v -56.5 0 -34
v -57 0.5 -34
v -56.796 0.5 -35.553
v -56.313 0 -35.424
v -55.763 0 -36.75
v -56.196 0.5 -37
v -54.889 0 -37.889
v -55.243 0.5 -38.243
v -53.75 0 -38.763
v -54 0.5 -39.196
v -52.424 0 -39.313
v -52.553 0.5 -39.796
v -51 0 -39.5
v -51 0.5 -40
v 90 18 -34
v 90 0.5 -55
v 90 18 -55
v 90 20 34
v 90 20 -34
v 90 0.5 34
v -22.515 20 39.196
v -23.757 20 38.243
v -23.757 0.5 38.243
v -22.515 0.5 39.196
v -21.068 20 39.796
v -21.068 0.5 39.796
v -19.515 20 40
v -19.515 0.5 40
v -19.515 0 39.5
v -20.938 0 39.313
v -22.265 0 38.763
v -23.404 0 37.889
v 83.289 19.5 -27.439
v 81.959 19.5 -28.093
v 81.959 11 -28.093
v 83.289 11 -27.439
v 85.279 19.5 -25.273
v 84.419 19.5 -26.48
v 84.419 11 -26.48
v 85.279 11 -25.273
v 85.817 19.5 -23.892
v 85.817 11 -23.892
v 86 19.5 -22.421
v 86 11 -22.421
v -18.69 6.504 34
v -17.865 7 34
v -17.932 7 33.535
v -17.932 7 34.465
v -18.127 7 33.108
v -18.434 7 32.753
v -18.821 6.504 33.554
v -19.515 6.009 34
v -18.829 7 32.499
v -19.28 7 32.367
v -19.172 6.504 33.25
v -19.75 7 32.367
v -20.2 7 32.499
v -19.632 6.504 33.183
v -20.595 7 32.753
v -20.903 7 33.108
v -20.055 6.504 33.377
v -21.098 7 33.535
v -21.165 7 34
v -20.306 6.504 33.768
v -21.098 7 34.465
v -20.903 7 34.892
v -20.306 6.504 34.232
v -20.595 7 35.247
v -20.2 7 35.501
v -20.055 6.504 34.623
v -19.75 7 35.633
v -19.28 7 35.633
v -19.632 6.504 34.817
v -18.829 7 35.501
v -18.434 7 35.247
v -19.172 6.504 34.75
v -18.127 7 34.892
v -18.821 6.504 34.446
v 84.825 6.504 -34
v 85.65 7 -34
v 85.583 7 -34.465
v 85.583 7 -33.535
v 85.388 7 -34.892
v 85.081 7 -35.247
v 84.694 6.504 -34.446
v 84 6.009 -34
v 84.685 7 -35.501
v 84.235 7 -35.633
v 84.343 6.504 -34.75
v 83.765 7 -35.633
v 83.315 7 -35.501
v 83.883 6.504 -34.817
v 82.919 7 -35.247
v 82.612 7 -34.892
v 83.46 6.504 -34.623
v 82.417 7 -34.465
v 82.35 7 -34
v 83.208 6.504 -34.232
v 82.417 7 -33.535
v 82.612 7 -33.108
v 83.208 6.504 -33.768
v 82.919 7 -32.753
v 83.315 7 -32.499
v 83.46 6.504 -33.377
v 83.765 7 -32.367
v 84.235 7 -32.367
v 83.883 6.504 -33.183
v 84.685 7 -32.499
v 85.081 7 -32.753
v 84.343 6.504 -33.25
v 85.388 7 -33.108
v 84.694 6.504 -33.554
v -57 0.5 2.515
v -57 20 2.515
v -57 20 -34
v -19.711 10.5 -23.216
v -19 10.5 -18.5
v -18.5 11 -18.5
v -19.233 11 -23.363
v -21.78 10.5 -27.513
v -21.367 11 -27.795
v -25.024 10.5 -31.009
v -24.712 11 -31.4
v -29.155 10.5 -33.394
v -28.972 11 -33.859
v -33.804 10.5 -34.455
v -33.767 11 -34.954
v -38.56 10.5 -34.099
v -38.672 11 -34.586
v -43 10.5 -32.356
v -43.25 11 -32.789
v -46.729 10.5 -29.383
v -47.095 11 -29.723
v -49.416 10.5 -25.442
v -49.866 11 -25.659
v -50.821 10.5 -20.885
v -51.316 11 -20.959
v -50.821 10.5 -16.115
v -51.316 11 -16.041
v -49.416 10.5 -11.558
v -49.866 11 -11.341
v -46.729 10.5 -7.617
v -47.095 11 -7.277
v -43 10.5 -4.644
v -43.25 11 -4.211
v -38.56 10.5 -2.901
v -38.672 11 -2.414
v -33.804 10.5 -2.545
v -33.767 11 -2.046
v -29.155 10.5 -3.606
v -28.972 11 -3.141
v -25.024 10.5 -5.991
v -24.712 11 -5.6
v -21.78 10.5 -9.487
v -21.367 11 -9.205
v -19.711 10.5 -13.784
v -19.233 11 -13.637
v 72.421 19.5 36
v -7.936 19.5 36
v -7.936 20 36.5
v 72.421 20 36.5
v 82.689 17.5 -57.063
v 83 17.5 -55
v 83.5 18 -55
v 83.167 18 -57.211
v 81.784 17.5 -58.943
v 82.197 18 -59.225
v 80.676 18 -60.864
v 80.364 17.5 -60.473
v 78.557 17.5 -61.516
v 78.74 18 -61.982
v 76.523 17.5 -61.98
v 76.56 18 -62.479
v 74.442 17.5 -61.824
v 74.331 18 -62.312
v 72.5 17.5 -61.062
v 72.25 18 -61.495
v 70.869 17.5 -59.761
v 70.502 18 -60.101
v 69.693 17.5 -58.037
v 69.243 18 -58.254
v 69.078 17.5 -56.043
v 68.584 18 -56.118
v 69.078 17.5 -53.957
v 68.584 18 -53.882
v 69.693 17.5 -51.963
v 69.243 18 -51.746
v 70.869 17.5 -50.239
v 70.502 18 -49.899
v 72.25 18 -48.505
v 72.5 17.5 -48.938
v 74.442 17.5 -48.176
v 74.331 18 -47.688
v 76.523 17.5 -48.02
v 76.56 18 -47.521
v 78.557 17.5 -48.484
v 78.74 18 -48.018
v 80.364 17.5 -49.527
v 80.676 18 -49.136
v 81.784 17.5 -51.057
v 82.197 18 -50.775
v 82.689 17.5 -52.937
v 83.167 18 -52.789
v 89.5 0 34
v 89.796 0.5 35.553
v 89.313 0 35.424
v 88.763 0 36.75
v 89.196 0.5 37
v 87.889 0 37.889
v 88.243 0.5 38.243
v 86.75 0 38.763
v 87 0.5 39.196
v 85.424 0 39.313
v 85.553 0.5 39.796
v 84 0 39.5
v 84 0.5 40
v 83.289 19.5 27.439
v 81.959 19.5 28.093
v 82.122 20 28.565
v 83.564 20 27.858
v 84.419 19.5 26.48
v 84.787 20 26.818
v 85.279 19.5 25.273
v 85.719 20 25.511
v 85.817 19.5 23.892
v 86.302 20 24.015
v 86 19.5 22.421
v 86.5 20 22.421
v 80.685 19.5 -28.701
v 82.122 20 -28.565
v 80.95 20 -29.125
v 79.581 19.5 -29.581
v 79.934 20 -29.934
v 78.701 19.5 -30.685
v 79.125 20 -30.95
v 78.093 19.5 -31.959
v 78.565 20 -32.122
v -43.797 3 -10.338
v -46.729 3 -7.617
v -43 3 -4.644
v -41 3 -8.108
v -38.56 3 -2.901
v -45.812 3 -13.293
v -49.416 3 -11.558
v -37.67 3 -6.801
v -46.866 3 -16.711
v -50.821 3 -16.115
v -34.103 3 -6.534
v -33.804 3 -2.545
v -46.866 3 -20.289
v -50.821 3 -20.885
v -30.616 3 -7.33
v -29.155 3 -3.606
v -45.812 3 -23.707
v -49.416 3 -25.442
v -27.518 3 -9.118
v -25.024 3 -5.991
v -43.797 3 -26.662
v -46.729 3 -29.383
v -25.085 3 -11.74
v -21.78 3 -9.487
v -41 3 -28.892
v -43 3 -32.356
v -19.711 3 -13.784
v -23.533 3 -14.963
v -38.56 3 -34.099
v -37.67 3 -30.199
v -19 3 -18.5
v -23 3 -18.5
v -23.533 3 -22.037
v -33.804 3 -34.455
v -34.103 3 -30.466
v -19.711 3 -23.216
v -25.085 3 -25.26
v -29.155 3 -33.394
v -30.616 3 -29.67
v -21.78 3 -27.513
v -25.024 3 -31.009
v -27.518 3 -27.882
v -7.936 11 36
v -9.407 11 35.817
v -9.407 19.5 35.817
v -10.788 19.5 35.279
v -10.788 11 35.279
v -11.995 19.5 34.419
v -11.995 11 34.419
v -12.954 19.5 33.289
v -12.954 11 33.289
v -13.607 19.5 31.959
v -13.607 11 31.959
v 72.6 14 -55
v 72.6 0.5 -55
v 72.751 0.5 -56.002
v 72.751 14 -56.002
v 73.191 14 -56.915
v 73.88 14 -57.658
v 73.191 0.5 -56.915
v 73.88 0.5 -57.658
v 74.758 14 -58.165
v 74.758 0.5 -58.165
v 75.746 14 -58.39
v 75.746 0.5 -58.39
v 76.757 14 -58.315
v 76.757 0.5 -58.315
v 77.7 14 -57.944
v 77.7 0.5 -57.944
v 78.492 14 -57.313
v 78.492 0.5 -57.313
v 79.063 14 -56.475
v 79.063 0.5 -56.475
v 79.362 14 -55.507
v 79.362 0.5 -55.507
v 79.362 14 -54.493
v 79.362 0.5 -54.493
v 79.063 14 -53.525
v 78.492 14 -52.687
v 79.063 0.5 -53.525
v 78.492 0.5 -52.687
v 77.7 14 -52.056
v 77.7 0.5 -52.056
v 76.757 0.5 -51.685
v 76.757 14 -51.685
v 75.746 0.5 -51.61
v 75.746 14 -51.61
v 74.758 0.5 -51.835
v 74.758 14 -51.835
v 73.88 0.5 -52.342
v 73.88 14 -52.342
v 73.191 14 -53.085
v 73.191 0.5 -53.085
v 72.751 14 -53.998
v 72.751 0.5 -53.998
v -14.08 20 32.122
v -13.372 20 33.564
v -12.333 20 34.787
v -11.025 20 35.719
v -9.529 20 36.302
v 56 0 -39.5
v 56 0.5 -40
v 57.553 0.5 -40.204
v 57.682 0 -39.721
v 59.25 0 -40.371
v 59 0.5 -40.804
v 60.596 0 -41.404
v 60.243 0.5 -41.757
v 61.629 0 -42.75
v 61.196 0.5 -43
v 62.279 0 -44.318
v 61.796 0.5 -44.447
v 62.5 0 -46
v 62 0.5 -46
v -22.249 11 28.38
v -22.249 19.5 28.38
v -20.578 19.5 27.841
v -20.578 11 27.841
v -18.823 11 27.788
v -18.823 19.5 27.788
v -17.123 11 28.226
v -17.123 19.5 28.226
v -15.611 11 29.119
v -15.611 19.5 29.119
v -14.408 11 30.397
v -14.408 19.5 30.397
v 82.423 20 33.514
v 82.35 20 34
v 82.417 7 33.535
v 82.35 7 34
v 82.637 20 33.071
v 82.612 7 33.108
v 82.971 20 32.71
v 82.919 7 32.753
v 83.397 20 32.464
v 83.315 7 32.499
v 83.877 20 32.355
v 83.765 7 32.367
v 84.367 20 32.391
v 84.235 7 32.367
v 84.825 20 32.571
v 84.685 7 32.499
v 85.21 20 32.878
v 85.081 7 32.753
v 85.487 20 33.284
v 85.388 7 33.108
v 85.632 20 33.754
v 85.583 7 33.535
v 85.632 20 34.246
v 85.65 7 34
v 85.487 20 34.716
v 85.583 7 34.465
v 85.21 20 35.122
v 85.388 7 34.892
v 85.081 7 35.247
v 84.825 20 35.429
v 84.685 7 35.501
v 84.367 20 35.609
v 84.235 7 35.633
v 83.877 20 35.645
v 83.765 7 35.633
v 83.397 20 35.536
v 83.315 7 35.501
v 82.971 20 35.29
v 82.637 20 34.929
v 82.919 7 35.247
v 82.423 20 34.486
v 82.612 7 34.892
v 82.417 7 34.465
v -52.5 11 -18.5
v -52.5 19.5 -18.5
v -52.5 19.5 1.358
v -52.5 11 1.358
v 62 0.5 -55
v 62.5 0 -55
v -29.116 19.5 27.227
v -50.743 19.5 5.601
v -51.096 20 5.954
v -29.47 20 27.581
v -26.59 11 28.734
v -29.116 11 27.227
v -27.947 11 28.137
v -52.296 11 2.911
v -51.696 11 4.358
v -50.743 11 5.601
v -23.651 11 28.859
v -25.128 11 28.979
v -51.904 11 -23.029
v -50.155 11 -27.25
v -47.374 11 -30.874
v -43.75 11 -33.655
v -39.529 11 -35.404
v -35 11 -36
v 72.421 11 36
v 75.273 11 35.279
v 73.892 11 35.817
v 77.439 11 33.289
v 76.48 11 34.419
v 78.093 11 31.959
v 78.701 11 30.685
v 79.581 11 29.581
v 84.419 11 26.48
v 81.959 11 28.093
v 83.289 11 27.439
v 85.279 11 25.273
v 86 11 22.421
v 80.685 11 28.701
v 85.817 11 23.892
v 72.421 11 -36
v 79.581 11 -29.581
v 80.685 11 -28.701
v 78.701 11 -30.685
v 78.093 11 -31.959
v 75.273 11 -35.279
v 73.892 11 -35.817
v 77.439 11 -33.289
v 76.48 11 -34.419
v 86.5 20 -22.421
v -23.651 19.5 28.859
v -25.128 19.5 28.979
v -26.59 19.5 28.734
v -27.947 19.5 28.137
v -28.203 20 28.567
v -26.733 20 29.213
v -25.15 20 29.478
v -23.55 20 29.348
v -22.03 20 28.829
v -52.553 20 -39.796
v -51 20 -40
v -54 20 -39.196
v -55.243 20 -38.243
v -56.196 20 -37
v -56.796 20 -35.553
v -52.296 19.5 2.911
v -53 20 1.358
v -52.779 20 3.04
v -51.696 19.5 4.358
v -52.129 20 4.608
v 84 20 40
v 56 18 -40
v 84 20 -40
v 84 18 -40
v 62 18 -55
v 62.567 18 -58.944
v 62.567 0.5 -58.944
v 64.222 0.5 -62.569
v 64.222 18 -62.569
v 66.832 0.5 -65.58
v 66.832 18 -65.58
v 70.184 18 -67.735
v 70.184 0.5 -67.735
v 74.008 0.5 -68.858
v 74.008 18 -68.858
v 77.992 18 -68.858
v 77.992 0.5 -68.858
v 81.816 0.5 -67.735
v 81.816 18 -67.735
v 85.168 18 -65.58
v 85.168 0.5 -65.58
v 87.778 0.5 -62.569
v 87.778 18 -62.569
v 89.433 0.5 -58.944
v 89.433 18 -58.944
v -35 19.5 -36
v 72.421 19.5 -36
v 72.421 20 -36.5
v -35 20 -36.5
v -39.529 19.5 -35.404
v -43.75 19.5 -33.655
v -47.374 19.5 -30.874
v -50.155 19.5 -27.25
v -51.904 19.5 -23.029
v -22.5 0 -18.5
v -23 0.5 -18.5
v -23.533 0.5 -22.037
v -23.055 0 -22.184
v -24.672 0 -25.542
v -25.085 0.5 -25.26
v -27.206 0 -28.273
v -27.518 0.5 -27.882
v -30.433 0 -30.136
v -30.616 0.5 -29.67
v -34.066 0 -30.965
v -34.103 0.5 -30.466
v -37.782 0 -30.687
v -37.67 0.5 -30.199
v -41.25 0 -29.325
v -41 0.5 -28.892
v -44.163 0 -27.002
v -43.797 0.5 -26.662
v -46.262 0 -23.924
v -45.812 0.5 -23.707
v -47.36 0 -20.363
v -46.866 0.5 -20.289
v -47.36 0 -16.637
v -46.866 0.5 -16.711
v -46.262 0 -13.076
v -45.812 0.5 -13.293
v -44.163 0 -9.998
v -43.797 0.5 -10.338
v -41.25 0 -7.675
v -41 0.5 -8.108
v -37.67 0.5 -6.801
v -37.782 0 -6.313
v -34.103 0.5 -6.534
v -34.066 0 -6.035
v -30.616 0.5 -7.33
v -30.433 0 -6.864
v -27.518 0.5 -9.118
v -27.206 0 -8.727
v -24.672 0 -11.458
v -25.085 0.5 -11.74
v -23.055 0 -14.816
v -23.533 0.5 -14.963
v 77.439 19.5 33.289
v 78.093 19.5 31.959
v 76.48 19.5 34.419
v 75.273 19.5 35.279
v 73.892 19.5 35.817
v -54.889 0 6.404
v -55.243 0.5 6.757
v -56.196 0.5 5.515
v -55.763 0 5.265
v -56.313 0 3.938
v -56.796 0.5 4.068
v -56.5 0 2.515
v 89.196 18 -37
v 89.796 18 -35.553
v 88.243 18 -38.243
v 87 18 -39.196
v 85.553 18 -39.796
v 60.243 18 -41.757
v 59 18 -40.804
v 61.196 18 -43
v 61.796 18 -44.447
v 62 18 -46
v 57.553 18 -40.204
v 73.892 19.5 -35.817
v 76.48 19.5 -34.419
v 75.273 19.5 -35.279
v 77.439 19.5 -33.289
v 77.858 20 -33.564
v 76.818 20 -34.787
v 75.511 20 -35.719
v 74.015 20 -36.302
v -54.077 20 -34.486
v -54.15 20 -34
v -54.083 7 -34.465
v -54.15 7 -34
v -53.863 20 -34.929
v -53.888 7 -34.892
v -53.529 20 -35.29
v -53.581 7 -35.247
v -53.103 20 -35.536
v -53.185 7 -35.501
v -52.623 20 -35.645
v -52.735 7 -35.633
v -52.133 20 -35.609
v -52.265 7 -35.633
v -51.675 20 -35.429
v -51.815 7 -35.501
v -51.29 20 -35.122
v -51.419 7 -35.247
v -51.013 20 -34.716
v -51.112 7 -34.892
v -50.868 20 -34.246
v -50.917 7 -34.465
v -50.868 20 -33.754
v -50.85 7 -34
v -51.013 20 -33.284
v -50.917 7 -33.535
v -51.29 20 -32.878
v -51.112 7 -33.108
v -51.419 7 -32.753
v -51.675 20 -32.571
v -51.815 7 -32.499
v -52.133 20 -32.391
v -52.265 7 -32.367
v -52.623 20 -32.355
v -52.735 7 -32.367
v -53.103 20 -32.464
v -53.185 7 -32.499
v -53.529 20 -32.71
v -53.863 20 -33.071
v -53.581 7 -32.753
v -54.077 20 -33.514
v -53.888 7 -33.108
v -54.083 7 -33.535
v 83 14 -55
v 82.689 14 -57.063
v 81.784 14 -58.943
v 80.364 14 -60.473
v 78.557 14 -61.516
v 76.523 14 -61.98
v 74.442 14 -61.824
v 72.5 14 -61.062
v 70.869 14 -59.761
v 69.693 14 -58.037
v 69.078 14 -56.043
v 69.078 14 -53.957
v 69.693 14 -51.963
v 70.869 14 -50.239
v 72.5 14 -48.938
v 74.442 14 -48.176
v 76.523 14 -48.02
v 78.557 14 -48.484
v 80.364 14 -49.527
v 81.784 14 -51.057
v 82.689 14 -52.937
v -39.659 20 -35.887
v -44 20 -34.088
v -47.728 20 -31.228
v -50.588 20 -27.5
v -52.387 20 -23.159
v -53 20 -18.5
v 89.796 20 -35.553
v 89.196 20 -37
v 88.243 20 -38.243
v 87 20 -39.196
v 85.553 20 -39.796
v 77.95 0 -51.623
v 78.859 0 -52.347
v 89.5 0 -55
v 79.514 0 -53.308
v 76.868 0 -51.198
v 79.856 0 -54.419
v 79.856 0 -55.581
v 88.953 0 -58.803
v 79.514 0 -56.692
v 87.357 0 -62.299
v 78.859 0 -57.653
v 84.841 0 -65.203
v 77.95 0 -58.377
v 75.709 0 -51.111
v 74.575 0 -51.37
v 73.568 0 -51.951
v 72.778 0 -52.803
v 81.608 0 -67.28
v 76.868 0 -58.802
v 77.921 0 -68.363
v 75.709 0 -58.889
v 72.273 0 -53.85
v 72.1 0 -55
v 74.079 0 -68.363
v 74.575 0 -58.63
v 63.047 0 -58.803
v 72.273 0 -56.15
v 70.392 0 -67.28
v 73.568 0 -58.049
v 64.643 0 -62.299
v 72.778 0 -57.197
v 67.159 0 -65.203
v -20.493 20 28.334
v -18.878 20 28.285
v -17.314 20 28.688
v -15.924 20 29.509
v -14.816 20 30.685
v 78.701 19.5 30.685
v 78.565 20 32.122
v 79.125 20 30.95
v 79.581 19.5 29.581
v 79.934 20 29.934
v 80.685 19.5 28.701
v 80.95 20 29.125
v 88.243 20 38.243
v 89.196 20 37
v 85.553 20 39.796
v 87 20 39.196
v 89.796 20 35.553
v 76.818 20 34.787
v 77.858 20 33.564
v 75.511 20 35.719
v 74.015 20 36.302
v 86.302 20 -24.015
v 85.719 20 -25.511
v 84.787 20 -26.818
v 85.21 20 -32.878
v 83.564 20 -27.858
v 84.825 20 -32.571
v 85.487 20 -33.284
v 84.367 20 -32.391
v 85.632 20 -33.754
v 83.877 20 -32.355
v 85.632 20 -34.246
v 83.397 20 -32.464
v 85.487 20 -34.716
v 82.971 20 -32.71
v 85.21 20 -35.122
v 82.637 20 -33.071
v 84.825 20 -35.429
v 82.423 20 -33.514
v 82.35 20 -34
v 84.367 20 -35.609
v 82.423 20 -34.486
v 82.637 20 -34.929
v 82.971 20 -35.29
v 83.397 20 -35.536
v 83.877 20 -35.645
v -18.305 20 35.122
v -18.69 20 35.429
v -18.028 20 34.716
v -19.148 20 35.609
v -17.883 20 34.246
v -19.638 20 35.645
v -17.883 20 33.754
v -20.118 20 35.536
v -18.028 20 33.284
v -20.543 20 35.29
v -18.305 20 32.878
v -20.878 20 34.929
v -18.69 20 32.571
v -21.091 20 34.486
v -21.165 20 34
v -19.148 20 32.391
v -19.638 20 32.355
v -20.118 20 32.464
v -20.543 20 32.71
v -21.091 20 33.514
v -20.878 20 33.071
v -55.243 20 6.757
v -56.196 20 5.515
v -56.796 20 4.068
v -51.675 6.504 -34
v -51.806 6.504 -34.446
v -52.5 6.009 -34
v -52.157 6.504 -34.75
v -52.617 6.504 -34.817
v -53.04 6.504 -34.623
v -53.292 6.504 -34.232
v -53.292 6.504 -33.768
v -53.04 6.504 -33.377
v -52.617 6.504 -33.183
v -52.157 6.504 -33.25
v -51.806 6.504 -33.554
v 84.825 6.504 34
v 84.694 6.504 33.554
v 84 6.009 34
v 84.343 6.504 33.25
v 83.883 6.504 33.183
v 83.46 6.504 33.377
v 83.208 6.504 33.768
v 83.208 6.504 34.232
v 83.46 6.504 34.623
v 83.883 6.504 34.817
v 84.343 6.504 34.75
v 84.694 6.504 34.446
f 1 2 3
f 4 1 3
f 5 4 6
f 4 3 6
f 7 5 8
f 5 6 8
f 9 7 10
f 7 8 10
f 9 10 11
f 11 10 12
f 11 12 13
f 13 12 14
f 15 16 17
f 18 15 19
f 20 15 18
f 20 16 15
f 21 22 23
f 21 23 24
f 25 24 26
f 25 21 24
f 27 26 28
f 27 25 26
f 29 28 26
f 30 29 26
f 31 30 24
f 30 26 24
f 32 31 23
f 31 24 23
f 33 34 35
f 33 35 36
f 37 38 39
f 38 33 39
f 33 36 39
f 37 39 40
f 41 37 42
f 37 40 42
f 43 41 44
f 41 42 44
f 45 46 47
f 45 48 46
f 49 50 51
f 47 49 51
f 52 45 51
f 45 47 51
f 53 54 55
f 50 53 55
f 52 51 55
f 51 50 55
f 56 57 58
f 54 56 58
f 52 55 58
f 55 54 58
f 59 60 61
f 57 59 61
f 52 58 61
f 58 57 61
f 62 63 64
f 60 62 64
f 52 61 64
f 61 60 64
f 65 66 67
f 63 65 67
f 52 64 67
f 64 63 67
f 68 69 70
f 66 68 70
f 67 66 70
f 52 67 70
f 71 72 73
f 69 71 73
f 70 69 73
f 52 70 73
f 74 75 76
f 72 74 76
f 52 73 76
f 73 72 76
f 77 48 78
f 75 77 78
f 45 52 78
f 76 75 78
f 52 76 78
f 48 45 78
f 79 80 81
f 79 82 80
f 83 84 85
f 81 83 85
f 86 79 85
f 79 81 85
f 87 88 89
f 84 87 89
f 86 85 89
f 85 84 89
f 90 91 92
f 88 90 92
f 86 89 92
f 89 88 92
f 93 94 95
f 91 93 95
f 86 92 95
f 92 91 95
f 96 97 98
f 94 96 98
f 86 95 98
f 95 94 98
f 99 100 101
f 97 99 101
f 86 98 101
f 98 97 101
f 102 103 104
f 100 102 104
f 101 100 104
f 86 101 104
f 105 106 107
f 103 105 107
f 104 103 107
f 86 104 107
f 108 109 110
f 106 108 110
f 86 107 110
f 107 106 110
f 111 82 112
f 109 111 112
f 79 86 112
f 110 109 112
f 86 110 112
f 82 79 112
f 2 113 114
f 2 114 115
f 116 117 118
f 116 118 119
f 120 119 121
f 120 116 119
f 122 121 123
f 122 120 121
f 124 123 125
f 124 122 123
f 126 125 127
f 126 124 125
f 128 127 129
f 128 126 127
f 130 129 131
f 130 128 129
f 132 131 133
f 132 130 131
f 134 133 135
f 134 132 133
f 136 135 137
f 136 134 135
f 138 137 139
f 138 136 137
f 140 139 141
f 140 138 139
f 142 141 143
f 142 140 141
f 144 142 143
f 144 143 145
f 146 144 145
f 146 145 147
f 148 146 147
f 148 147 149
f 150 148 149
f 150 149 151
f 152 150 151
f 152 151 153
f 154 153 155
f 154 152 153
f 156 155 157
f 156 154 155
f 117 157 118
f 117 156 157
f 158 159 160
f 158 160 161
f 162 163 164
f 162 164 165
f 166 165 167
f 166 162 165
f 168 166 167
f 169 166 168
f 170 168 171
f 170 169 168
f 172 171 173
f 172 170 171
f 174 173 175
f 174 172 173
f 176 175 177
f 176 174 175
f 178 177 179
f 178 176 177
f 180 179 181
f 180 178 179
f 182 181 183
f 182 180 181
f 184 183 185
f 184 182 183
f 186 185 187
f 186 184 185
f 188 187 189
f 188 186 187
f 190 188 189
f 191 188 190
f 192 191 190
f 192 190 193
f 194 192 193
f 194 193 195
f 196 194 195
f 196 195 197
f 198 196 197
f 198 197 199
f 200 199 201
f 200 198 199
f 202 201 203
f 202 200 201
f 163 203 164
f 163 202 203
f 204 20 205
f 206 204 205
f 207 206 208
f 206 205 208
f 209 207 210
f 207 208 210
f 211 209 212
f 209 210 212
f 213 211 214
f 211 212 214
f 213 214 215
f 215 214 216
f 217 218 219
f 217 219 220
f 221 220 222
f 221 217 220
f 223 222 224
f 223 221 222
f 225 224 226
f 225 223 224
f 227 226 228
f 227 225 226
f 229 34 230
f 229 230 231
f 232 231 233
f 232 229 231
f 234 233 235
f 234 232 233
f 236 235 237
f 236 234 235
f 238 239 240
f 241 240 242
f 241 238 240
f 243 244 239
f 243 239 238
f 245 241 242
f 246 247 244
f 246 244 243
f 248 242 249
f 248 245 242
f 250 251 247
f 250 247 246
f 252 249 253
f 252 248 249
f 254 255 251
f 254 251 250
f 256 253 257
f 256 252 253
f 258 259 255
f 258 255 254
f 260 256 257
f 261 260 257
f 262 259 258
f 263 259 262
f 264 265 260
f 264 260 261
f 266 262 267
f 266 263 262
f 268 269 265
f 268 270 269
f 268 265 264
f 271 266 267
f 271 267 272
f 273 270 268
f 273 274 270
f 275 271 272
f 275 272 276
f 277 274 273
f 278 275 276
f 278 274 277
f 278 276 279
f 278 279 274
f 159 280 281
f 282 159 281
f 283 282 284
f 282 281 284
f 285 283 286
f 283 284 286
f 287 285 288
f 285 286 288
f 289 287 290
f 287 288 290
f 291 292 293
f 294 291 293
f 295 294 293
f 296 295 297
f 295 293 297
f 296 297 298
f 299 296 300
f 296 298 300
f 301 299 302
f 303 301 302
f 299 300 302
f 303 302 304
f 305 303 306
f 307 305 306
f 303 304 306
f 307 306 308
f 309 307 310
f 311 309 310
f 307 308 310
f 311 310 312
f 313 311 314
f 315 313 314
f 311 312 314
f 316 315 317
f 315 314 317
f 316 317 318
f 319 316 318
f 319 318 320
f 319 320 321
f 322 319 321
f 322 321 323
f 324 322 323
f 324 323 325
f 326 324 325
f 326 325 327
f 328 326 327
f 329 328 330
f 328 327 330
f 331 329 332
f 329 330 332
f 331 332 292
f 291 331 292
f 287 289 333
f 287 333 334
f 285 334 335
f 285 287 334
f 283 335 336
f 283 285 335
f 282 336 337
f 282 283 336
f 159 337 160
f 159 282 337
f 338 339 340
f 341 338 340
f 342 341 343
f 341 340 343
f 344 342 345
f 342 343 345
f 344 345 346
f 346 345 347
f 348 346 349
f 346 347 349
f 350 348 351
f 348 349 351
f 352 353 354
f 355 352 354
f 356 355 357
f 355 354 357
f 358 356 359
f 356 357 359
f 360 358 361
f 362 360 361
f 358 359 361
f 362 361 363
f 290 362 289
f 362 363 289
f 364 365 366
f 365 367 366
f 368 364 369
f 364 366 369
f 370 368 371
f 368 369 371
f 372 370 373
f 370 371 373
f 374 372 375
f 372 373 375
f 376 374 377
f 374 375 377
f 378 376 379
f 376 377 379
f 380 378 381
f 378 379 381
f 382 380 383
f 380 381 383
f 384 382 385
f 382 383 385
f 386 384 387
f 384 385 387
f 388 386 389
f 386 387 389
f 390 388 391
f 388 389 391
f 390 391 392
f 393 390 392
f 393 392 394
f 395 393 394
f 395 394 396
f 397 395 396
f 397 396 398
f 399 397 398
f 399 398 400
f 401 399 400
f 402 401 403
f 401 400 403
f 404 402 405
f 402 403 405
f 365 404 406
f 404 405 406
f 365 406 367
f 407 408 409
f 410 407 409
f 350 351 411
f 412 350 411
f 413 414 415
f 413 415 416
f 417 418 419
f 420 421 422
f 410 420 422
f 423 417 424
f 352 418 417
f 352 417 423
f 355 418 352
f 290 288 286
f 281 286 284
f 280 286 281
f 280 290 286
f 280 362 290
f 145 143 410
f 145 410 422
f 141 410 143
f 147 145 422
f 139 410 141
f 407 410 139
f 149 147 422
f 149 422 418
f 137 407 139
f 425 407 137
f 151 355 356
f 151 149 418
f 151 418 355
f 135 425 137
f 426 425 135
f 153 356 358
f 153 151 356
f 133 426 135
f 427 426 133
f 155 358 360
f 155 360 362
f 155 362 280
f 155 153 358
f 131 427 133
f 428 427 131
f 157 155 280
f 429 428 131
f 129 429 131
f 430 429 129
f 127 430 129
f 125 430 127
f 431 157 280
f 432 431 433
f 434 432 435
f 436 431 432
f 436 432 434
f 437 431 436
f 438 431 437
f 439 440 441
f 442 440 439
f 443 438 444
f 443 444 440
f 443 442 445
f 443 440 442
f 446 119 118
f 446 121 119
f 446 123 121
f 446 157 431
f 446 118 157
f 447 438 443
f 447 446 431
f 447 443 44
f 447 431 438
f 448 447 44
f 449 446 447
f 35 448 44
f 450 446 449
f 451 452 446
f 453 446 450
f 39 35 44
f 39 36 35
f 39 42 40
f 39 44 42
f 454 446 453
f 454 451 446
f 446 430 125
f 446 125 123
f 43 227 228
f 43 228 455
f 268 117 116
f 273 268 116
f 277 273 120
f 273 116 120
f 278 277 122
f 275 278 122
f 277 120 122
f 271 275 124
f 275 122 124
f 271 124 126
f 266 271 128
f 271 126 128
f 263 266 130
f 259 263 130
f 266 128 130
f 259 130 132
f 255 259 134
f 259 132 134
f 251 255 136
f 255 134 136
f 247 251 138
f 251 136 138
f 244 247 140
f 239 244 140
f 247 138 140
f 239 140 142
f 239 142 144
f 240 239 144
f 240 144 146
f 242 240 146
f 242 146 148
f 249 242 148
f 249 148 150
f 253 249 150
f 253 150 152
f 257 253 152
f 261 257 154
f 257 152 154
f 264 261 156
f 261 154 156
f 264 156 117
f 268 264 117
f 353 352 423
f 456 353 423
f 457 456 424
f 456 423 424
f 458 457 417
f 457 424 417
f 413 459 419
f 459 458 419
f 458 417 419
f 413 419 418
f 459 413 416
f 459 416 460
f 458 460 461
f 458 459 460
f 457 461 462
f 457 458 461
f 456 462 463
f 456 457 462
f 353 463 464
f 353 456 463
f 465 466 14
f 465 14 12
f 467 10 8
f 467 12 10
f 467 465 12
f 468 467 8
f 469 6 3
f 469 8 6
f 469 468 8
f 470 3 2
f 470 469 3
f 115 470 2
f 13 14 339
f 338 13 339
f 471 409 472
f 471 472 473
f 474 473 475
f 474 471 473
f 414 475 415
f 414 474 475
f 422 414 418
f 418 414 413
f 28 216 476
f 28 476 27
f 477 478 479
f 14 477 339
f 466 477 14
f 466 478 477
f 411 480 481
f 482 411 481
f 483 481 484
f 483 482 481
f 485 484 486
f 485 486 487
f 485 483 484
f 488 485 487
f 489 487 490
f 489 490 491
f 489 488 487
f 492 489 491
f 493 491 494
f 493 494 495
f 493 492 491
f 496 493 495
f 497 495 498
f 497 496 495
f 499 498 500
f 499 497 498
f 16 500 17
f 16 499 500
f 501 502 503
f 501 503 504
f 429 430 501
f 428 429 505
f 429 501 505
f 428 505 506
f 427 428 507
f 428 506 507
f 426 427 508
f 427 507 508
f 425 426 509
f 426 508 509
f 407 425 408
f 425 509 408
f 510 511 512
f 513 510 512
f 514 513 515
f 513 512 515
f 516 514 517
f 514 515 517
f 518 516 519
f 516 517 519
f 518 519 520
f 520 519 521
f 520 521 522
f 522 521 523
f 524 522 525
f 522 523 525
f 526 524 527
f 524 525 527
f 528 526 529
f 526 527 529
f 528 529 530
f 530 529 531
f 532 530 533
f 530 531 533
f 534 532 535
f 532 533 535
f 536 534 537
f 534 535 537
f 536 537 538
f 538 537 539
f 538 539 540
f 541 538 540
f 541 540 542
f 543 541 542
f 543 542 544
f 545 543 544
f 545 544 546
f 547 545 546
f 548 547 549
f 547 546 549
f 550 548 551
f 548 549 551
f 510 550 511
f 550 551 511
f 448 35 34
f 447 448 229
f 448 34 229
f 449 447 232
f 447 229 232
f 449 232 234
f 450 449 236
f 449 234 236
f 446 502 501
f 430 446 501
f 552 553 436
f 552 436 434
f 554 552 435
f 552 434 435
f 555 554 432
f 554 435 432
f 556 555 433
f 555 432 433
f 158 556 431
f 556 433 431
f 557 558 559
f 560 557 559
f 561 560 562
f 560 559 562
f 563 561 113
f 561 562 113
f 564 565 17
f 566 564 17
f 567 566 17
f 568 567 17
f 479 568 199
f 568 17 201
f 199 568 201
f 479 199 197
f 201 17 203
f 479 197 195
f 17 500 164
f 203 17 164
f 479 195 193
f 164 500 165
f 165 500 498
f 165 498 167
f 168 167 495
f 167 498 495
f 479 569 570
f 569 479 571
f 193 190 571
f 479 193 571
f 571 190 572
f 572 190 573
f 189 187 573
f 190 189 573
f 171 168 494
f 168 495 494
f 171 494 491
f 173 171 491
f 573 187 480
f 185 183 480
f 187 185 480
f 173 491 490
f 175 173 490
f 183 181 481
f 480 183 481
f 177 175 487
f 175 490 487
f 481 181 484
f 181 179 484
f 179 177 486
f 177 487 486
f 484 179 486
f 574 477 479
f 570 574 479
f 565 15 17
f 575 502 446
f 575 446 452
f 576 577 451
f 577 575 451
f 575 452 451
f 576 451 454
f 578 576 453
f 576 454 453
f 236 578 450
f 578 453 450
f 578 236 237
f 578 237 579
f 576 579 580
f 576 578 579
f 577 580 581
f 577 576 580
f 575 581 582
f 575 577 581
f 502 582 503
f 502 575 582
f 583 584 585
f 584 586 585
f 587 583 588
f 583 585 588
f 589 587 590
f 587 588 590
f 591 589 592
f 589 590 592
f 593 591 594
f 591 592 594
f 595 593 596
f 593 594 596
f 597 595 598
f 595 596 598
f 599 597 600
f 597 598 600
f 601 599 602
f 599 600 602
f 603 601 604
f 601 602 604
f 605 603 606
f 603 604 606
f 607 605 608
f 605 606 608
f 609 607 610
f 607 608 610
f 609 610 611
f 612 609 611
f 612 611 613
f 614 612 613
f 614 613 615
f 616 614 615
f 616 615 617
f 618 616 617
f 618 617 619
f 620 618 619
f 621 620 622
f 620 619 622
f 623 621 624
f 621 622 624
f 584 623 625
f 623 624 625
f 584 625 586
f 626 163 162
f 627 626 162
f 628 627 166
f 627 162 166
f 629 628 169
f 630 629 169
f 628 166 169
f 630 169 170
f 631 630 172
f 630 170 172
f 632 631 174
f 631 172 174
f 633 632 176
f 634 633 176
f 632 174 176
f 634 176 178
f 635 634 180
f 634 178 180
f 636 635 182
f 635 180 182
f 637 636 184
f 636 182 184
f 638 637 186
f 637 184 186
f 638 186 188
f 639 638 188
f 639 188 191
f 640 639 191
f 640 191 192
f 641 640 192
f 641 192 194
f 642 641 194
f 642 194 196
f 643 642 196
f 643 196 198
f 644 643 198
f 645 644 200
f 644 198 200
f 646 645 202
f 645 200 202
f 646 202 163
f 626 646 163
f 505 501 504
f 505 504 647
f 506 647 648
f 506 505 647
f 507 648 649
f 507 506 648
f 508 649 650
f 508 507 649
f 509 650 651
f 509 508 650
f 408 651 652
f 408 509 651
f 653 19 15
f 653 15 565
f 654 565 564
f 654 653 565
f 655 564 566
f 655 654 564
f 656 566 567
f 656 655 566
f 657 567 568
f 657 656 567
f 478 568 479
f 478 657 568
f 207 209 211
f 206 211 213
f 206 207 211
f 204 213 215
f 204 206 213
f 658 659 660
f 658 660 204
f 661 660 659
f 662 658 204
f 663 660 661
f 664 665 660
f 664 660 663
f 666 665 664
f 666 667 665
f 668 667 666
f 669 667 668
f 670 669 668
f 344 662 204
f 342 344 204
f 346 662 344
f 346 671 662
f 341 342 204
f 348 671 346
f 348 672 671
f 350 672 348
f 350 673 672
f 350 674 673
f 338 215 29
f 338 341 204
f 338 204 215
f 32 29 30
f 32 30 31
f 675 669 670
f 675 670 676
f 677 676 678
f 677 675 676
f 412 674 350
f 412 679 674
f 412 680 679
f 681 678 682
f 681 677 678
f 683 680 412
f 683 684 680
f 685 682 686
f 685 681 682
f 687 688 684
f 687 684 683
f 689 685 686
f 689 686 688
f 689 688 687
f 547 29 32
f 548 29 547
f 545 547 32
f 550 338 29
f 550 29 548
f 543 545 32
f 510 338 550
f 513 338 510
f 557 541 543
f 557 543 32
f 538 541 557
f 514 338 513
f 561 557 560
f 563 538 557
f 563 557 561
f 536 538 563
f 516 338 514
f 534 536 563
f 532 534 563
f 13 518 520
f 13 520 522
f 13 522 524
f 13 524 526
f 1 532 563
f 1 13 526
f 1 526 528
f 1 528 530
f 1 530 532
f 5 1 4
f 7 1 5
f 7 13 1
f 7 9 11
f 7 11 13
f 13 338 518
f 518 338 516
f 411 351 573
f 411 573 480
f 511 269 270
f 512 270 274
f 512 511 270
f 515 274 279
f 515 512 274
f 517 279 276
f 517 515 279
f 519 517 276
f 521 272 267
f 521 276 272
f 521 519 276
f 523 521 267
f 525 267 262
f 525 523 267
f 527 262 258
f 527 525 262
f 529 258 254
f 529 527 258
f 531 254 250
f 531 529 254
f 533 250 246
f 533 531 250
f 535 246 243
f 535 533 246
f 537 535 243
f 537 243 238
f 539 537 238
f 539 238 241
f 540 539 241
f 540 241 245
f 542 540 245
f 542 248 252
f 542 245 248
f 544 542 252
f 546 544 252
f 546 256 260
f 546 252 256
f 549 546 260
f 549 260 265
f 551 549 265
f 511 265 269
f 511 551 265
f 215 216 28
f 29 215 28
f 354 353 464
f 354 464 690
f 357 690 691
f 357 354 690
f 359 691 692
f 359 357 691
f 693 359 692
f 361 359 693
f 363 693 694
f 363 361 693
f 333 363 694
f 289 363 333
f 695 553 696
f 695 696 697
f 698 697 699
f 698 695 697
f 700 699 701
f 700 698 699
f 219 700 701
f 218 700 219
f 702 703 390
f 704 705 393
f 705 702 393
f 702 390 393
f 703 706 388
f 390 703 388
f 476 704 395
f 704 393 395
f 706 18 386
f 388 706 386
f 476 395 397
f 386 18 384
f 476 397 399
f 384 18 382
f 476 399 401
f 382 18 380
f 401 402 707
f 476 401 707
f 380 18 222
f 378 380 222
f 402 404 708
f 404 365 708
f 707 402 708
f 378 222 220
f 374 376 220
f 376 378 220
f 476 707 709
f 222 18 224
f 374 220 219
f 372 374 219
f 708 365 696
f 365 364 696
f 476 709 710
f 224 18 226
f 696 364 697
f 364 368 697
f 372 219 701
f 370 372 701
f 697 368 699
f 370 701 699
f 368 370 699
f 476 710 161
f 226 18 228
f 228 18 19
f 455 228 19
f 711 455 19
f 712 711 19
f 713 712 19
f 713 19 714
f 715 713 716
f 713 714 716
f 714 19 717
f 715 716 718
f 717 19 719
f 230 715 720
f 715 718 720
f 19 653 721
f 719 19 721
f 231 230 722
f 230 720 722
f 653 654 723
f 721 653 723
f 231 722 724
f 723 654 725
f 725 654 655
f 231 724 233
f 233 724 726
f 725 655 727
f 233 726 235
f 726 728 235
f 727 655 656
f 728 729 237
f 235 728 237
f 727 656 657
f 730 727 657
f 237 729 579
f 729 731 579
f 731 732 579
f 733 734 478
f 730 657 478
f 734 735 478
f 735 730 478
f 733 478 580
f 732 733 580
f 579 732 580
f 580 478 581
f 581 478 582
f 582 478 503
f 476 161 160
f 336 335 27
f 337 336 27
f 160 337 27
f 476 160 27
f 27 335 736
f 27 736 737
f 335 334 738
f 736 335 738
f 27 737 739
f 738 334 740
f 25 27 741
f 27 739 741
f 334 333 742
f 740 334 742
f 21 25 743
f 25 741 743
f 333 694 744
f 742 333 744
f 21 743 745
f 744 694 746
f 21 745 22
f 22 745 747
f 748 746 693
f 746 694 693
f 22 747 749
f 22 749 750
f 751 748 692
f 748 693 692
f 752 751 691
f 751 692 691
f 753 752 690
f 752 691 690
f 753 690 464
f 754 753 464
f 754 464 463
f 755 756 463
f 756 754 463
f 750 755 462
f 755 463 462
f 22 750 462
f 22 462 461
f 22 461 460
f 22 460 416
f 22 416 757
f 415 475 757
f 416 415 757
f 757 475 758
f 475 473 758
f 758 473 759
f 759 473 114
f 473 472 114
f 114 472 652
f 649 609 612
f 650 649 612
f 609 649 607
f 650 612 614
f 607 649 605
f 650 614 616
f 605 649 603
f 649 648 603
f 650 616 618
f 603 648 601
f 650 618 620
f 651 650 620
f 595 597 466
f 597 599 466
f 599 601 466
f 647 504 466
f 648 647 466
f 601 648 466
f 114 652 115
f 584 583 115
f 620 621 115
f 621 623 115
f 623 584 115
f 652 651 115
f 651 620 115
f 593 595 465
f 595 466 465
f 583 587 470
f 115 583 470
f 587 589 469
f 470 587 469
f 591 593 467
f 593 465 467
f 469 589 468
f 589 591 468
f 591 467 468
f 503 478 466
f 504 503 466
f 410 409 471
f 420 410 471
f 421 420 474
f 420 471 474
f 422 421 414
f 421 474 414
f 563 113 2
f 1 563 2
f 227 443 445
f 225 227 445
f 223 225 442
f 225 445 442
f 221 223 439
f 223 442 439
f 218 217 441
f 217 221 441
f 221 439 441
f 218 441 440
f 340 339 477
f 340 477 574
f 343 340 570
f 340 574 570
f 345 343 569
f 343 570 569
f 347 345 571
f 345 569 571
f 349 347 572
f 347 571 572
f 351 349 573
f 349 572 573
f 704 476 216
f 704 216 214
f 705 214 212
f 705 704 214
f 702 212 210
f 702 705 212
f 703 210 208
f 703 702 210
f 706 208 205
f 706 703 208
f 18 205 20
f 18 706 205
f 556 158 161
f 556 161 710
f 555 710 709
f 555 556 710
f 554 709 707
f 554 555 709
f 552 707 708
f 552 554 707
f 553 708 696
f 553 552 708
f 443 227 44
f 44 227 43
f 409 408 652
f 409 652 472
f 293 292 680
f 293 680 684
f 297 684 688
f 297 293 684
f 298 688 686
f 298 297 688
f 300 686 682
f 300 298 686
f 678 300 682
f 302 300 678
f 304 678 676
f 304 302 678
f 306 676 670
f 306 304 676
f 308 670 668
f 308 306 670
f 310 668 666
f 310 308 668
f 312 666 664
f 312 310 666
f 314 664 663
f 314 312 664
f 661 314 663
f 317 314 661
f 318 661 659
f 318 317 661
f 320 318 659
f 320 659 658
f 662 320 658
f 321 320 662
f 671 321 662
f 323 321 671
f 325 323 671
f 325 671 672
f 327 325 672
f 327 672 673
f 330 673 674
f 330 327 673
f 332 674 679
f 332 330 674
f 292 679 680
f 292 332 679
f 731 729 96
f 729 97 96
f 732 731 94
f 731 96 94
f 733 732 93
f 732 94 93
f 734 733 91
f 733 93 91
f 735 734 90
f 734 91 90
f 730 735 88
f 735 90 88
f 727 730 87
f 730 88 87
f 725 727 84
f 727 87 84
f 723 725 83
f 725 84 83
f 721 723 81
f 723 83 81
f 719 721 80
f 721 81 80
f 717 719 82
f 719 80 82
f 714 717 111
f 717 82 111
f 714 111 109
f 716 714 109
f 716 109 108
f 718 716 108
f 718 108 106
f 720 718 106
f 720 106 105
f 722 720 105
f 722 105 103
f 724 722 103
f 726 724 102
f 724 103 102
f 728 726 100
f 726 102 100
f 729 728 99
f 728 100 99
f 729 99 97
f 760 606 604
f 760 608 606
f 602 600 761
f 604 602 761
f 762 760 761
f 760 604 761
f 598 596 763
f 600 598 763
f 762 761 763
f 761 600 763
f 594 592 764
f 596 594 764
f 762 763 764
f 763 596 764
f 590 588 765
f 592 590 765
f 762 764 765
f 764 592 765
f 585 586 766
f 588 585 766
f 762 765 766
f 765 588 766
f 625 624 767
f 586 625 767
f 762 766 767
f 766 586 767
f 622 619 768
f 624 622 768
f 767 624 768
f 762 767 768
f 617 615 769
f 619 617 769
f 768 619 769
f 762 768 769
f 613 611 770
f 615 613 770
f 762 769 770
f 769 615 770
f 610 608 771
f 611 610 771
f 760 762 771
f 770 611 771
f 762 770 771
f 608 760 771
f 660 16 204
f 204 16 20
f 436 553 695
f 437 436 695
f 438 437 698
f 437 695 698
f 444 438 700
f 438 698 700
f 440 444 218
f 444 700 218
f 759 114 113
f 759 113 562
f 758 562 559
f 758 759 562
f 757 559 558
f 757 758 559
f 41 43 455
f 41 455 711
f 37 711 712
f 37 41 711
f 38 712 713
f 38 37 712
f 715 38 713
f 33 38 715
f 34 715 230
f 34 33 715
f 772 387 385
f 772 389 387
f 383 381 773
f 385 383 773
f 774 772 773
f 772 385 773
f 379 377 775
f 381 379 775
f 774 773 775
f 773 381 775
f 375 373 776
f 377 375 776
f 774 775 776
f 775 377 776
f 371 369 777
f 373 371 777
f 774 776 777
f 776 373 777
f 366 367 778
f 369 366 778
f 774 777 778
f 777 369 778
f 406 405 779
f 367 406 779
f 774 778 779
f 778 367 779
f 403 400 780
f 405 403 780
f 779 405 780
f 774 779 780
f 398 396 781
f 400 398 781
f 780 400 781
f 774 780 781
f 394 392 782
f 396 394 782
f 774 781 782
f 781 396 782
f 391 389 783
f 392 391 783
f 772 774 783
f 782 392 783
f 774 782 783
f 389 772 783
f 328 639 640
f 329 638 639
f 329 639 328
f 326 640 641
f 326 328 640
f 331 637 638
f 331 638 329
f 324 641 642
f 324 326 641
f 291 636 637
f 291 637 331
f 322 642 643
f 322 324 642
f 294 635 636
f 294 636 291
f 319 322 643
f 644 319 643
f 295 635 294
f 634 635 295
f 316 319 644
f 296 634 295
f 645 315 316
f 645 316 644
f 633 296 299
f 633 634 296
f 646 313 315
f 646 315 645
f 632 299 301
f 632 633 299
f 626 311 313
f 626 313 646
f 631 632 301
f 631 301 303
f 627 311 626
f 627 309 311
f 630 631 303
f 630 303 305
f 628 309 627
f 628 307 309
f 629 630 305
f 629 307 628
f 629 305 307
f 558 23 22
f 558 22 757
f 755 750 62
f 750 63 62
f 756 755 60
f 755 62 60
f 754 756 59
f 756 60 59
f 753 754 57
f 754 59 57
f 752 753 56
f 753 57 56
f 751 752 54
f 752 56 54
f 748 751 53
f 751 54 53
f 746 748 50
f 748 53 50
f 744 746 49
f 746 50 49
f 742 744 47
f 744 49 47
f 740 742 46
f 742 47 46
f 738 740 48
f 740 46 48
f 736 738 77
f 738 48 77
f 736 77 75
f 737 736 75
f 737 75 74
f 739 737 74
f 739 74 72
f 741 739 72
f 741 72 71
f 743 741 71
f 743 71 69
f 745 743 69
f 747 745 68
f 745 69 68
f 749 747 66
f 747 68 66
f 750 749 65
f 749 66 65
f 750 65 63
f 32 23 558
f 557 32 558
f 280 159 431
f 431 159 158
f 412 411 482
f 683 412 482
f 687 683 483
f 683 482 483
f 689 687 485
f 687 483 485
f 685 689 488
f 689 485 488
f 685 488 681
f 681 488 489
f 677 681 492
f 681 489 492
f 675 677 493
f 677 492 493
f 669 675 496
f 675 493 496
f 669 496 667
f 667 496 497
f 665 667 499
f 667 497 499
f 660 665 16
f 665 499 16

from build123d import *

# Parameters (mm, degrees)
SKETCH2_R                   = 12
BOSS_EXTRUDE1_DEPTH         = 20
FILLET1_R                   = 6
TAP_DRILL_FOR_M4_TAP1_D     = 3.3
TAP_DRILL_FOR_M4_TAP1_DEPTH = 13
TAP_DRILL_FOR_M4_TAP1_TIP   = 0.991420021
CUT_EXTRUDE4_DEPTH          = 9
FILLET2_R                   = 6
SKETCH8_R                   = 16
CUT_EXTRUDE5_DEPTH          = 8
TAP_DRILL_FOR_M8_TAP1_D     = 6.8
CUT_EXTRUDE6_DEPTH          = 2
SKETCH13_R                  = 7
CUT_EXTRUDE7_DEPTH          = 4
CHAMFER1_SIZE               = 0.5
CHAMFER2_SIZE               = 0.5


with BuildPart() as part:
    # Sketch2 → Boss-Extrude1 (new body)
    with BuildSketch(Plane(origin=(0, 0, 0), x_dir=(1, 0, 0), z_dir=(0, 1, 0))):
        with BuildLine():
            Line((-57, 40), (62, 40))
            Line((62, 40), (62, 55))
            ThreePointArc((62, 55), (76, 69), (90, 55))
            Line((90, 55), (90, -40))
            Line((90, -40), (-22, -40))
            Line((-22, -40), (-57, -5))
            Line((-57, -5), (-57, 40))
        make_face()
        with Locations((-35, 18.5)):
            Circle(SKETCH2_R, mode=Mode.SUBTRACT)
    extrude(amount=BOSS_EXTRUDE1_DEPTH)

    # Fillet1
    fillet1_edges = [part.edges().sort_by_distance(p)[0] for p in [
        (90, 10, 40),
        (-22, 10, 40),
        (-57, 10, 5),
        (-57, 10, -40),
        (62, 10, -40),
    ]]
    fillet(fillet1_edges, radius=FILLET1_R)

    # Tap Drill for M4 Tap1
    with Locations(Plane(origin=(0, 20, 0), x_dir=(1, 0, 0), z_dir=(0, 1, 0))):
        with Locations((-19.514718626, -34), (-52.5, 34), (84, -34), (84, 34)):
            Hole(TAP_DRILL_FOR_M4_TAP1_D / 2, depth=TAP_DRILL_FOR_M4_TAP1_DEPTH)
            with Locations((0, 0, -(TAP_DRILL_FOR_M4_TAP1_DEPTH + TAP_DRILL_FOR_M4_TAP1_TIP / 2))):  # 118° drill point
                Cone(0, TAP_DRILL_FOR_M4_TAP1_D / 2, TAP_DRILL_FOR_M4_TAP1_TIP, mode=Mode.SUBTRACT)

    # Sketch7 → Cut-Extrude4 (cut)
    with BuildSketch(Plane(origin=(0, 20, 0), x_dir=(1, 0, 0), z_dir=(0, 1, 0))):
        with BuildLine():
            Line((-52.5, 18.5), (-52.5, -1.357864376))
            ThreePointArc((-52.5, -1.357864376), (-52.043277195, -3.65396497), (-50.742640687, -5.600505063))
            Line((-50.742640687, -5.600505063), (-25.115965744, -31.227180006))
            ThreePointArc((-25.115965744, -31.227180006), (-17.122947173, -28.225752922), (-13.593358985, -36))
            Line((-13.593358985, -36), (78.078640359, -36))
            ThreePointArc((78.078640359, -36), (79.580582618, -29.580582618), (86, -28.078640359))
            Line((86, -28.078640359), (86, 28.078640359))
            ThreePointArc((86, 28.078640359), (79.580582618, 29.580582618), (78.078640359, 36))
            Line((78.078640359, 36), (-35, 36))
            ThreePointArc((-35, 36), (-47.374368671, 30.874368671), (-52.5, 18.5))
        make_face()
    extrude(amount=-CUT_EXTRUDE4_DEPTH, mode=Mode.SUBTRACT)

    # Fillet2
    fillet2_edges = [part.edges().sort_by_distance(p)[0] for p in [
        (86, 15.5, 28.078640359),
        (78.078640359, 15.5, 36),
        (-13.593358985, 15.5, 36),
        (-25.115965744, 15.5, 31.227180006),
        (78.078640359, 15.5, -36),
        (86, 15.5, -28.078640359),
    ]]
    fillet(fillet2_edges, radius=FILLET2_R)

    # Sketch8 → Cut-Extrude5 (cut)
    with BuildSketch(Plane(origin=(0, 11, 0), x_dir=(1, 0, 0), z_dir=(0, 1, 0))):
        with Locations((-35, 18.5)):
            Circle(SKETCH8_R)
    extrude(amount=-CUT_EXTRUDE5_DEPTH, mode=Mode.SUBTRACT)

    # Tap Drill for M8 Tap1 (through all)
    with Locations(Plane(origin=(0, 20, 0), x_dir=(1, 0, 0), z_dir=(0, 1, 0))):
        with Locations((76, 55)):
            Hole(TAP_DRILL_FOR_M8_TAP1_D / 2)

    # Sketch12 → Cut-Extrude6 (cut)
    with BuildSketch(Plane(origin=(0, 20, 0), x_dir=(1, 0, 0), z_dir=(0, 1, 0))):
        with BuildLine():
            Line((84, 40), (50.858800106, 40))
            Line((50.858800106, 40), (50.858800106, 55))
            ThreePointArc((50.858800106, 55), (76, 80.141199894), (101.141199894, 55))
            Line((101.141199894, 55), (101.141199894, 34))
            Line((101.141199894, 34), (90, 34))
            ThreePointArc((90, 34), (88.242640687, 38.242640687), (84, 40))
        make_face()
    extrude(amount=-CUT_EXTRUDE6_DEPTH, mode=Mode.SUBTRACT)

    # Sketch13 → Cut-Extrude7 (cut)
    with BuildSketch(Plane(origin=(0, 18, 0), x_dir=(1, 0, 0), z_dir=(0, 1, 0))):
        with Locations((76, 55)):
            Circle(SKETCH13_R)
    extrude(amount=-CUT_EXTRUDE7_DEPTH, mode=Mode.SUBTRACT)

    # Chamfer1
    chamfer1_edges = [part.edges().sort_by_distance(p)[0] for p in [
        (62, 0, -50.5),
        (76, 0, -69),
        (90, 0, -10.5),
        (-47, 0, -18.5),
        (79.4, 0, -55),
        (32.242640687, 0, 40),
        (-39.5, 0, 22.5),
        (-57, 0, -15.742640687),
        (2.5, 0, -40),
        (88.242640687, 0, 38.242640687),
        (-55.242640687, 0, -38.242640687),
        (-56.543277195, 0, 4.81081922),
        (-21.81081922, 0, 39.543277195),
        (60.242640687, 0, -41.757359313),
    ]]
    chamfer(chamfer1_edges, length=CHAMFER1_SIZE)

    # Chamfer2
    chamfer2_edges = [part.edges().sort_by_distance(p)[0] for p in [
        (-17.122947173, 20, 28.225752922),
        (32.242640687, 20, 36),
        (79.580582618, 20, -29.580582618),
        (86, 20, 0),
        (18.710731912, 20, -36),
        (79.580582618, 20, 29.580582618),
        (-25.866850849, 20, 28.901520169),
        (-11.417913194, 20, 34.886466108),
        (84.886466108, 20, -25.903194568),
        (75.903194568, 20, -34.886466108),
        (84.886466108, 20, 25.903194568),
        (75.903194568, 20, 34.886466108),
        (-51, 11, -18.5),
        (69, 18, -55),
        (-47.374368671, 20, -30.874368671),
        (-52.5, 20, -8.571067812),
        (-52.043277195, 20, 3.65396497),
        (-39.929417161, 20, 16.413728589),
    ]]
    chamfer(chamfer2_edges, length=CHAMFER2_SIZE)


solid = part.part
